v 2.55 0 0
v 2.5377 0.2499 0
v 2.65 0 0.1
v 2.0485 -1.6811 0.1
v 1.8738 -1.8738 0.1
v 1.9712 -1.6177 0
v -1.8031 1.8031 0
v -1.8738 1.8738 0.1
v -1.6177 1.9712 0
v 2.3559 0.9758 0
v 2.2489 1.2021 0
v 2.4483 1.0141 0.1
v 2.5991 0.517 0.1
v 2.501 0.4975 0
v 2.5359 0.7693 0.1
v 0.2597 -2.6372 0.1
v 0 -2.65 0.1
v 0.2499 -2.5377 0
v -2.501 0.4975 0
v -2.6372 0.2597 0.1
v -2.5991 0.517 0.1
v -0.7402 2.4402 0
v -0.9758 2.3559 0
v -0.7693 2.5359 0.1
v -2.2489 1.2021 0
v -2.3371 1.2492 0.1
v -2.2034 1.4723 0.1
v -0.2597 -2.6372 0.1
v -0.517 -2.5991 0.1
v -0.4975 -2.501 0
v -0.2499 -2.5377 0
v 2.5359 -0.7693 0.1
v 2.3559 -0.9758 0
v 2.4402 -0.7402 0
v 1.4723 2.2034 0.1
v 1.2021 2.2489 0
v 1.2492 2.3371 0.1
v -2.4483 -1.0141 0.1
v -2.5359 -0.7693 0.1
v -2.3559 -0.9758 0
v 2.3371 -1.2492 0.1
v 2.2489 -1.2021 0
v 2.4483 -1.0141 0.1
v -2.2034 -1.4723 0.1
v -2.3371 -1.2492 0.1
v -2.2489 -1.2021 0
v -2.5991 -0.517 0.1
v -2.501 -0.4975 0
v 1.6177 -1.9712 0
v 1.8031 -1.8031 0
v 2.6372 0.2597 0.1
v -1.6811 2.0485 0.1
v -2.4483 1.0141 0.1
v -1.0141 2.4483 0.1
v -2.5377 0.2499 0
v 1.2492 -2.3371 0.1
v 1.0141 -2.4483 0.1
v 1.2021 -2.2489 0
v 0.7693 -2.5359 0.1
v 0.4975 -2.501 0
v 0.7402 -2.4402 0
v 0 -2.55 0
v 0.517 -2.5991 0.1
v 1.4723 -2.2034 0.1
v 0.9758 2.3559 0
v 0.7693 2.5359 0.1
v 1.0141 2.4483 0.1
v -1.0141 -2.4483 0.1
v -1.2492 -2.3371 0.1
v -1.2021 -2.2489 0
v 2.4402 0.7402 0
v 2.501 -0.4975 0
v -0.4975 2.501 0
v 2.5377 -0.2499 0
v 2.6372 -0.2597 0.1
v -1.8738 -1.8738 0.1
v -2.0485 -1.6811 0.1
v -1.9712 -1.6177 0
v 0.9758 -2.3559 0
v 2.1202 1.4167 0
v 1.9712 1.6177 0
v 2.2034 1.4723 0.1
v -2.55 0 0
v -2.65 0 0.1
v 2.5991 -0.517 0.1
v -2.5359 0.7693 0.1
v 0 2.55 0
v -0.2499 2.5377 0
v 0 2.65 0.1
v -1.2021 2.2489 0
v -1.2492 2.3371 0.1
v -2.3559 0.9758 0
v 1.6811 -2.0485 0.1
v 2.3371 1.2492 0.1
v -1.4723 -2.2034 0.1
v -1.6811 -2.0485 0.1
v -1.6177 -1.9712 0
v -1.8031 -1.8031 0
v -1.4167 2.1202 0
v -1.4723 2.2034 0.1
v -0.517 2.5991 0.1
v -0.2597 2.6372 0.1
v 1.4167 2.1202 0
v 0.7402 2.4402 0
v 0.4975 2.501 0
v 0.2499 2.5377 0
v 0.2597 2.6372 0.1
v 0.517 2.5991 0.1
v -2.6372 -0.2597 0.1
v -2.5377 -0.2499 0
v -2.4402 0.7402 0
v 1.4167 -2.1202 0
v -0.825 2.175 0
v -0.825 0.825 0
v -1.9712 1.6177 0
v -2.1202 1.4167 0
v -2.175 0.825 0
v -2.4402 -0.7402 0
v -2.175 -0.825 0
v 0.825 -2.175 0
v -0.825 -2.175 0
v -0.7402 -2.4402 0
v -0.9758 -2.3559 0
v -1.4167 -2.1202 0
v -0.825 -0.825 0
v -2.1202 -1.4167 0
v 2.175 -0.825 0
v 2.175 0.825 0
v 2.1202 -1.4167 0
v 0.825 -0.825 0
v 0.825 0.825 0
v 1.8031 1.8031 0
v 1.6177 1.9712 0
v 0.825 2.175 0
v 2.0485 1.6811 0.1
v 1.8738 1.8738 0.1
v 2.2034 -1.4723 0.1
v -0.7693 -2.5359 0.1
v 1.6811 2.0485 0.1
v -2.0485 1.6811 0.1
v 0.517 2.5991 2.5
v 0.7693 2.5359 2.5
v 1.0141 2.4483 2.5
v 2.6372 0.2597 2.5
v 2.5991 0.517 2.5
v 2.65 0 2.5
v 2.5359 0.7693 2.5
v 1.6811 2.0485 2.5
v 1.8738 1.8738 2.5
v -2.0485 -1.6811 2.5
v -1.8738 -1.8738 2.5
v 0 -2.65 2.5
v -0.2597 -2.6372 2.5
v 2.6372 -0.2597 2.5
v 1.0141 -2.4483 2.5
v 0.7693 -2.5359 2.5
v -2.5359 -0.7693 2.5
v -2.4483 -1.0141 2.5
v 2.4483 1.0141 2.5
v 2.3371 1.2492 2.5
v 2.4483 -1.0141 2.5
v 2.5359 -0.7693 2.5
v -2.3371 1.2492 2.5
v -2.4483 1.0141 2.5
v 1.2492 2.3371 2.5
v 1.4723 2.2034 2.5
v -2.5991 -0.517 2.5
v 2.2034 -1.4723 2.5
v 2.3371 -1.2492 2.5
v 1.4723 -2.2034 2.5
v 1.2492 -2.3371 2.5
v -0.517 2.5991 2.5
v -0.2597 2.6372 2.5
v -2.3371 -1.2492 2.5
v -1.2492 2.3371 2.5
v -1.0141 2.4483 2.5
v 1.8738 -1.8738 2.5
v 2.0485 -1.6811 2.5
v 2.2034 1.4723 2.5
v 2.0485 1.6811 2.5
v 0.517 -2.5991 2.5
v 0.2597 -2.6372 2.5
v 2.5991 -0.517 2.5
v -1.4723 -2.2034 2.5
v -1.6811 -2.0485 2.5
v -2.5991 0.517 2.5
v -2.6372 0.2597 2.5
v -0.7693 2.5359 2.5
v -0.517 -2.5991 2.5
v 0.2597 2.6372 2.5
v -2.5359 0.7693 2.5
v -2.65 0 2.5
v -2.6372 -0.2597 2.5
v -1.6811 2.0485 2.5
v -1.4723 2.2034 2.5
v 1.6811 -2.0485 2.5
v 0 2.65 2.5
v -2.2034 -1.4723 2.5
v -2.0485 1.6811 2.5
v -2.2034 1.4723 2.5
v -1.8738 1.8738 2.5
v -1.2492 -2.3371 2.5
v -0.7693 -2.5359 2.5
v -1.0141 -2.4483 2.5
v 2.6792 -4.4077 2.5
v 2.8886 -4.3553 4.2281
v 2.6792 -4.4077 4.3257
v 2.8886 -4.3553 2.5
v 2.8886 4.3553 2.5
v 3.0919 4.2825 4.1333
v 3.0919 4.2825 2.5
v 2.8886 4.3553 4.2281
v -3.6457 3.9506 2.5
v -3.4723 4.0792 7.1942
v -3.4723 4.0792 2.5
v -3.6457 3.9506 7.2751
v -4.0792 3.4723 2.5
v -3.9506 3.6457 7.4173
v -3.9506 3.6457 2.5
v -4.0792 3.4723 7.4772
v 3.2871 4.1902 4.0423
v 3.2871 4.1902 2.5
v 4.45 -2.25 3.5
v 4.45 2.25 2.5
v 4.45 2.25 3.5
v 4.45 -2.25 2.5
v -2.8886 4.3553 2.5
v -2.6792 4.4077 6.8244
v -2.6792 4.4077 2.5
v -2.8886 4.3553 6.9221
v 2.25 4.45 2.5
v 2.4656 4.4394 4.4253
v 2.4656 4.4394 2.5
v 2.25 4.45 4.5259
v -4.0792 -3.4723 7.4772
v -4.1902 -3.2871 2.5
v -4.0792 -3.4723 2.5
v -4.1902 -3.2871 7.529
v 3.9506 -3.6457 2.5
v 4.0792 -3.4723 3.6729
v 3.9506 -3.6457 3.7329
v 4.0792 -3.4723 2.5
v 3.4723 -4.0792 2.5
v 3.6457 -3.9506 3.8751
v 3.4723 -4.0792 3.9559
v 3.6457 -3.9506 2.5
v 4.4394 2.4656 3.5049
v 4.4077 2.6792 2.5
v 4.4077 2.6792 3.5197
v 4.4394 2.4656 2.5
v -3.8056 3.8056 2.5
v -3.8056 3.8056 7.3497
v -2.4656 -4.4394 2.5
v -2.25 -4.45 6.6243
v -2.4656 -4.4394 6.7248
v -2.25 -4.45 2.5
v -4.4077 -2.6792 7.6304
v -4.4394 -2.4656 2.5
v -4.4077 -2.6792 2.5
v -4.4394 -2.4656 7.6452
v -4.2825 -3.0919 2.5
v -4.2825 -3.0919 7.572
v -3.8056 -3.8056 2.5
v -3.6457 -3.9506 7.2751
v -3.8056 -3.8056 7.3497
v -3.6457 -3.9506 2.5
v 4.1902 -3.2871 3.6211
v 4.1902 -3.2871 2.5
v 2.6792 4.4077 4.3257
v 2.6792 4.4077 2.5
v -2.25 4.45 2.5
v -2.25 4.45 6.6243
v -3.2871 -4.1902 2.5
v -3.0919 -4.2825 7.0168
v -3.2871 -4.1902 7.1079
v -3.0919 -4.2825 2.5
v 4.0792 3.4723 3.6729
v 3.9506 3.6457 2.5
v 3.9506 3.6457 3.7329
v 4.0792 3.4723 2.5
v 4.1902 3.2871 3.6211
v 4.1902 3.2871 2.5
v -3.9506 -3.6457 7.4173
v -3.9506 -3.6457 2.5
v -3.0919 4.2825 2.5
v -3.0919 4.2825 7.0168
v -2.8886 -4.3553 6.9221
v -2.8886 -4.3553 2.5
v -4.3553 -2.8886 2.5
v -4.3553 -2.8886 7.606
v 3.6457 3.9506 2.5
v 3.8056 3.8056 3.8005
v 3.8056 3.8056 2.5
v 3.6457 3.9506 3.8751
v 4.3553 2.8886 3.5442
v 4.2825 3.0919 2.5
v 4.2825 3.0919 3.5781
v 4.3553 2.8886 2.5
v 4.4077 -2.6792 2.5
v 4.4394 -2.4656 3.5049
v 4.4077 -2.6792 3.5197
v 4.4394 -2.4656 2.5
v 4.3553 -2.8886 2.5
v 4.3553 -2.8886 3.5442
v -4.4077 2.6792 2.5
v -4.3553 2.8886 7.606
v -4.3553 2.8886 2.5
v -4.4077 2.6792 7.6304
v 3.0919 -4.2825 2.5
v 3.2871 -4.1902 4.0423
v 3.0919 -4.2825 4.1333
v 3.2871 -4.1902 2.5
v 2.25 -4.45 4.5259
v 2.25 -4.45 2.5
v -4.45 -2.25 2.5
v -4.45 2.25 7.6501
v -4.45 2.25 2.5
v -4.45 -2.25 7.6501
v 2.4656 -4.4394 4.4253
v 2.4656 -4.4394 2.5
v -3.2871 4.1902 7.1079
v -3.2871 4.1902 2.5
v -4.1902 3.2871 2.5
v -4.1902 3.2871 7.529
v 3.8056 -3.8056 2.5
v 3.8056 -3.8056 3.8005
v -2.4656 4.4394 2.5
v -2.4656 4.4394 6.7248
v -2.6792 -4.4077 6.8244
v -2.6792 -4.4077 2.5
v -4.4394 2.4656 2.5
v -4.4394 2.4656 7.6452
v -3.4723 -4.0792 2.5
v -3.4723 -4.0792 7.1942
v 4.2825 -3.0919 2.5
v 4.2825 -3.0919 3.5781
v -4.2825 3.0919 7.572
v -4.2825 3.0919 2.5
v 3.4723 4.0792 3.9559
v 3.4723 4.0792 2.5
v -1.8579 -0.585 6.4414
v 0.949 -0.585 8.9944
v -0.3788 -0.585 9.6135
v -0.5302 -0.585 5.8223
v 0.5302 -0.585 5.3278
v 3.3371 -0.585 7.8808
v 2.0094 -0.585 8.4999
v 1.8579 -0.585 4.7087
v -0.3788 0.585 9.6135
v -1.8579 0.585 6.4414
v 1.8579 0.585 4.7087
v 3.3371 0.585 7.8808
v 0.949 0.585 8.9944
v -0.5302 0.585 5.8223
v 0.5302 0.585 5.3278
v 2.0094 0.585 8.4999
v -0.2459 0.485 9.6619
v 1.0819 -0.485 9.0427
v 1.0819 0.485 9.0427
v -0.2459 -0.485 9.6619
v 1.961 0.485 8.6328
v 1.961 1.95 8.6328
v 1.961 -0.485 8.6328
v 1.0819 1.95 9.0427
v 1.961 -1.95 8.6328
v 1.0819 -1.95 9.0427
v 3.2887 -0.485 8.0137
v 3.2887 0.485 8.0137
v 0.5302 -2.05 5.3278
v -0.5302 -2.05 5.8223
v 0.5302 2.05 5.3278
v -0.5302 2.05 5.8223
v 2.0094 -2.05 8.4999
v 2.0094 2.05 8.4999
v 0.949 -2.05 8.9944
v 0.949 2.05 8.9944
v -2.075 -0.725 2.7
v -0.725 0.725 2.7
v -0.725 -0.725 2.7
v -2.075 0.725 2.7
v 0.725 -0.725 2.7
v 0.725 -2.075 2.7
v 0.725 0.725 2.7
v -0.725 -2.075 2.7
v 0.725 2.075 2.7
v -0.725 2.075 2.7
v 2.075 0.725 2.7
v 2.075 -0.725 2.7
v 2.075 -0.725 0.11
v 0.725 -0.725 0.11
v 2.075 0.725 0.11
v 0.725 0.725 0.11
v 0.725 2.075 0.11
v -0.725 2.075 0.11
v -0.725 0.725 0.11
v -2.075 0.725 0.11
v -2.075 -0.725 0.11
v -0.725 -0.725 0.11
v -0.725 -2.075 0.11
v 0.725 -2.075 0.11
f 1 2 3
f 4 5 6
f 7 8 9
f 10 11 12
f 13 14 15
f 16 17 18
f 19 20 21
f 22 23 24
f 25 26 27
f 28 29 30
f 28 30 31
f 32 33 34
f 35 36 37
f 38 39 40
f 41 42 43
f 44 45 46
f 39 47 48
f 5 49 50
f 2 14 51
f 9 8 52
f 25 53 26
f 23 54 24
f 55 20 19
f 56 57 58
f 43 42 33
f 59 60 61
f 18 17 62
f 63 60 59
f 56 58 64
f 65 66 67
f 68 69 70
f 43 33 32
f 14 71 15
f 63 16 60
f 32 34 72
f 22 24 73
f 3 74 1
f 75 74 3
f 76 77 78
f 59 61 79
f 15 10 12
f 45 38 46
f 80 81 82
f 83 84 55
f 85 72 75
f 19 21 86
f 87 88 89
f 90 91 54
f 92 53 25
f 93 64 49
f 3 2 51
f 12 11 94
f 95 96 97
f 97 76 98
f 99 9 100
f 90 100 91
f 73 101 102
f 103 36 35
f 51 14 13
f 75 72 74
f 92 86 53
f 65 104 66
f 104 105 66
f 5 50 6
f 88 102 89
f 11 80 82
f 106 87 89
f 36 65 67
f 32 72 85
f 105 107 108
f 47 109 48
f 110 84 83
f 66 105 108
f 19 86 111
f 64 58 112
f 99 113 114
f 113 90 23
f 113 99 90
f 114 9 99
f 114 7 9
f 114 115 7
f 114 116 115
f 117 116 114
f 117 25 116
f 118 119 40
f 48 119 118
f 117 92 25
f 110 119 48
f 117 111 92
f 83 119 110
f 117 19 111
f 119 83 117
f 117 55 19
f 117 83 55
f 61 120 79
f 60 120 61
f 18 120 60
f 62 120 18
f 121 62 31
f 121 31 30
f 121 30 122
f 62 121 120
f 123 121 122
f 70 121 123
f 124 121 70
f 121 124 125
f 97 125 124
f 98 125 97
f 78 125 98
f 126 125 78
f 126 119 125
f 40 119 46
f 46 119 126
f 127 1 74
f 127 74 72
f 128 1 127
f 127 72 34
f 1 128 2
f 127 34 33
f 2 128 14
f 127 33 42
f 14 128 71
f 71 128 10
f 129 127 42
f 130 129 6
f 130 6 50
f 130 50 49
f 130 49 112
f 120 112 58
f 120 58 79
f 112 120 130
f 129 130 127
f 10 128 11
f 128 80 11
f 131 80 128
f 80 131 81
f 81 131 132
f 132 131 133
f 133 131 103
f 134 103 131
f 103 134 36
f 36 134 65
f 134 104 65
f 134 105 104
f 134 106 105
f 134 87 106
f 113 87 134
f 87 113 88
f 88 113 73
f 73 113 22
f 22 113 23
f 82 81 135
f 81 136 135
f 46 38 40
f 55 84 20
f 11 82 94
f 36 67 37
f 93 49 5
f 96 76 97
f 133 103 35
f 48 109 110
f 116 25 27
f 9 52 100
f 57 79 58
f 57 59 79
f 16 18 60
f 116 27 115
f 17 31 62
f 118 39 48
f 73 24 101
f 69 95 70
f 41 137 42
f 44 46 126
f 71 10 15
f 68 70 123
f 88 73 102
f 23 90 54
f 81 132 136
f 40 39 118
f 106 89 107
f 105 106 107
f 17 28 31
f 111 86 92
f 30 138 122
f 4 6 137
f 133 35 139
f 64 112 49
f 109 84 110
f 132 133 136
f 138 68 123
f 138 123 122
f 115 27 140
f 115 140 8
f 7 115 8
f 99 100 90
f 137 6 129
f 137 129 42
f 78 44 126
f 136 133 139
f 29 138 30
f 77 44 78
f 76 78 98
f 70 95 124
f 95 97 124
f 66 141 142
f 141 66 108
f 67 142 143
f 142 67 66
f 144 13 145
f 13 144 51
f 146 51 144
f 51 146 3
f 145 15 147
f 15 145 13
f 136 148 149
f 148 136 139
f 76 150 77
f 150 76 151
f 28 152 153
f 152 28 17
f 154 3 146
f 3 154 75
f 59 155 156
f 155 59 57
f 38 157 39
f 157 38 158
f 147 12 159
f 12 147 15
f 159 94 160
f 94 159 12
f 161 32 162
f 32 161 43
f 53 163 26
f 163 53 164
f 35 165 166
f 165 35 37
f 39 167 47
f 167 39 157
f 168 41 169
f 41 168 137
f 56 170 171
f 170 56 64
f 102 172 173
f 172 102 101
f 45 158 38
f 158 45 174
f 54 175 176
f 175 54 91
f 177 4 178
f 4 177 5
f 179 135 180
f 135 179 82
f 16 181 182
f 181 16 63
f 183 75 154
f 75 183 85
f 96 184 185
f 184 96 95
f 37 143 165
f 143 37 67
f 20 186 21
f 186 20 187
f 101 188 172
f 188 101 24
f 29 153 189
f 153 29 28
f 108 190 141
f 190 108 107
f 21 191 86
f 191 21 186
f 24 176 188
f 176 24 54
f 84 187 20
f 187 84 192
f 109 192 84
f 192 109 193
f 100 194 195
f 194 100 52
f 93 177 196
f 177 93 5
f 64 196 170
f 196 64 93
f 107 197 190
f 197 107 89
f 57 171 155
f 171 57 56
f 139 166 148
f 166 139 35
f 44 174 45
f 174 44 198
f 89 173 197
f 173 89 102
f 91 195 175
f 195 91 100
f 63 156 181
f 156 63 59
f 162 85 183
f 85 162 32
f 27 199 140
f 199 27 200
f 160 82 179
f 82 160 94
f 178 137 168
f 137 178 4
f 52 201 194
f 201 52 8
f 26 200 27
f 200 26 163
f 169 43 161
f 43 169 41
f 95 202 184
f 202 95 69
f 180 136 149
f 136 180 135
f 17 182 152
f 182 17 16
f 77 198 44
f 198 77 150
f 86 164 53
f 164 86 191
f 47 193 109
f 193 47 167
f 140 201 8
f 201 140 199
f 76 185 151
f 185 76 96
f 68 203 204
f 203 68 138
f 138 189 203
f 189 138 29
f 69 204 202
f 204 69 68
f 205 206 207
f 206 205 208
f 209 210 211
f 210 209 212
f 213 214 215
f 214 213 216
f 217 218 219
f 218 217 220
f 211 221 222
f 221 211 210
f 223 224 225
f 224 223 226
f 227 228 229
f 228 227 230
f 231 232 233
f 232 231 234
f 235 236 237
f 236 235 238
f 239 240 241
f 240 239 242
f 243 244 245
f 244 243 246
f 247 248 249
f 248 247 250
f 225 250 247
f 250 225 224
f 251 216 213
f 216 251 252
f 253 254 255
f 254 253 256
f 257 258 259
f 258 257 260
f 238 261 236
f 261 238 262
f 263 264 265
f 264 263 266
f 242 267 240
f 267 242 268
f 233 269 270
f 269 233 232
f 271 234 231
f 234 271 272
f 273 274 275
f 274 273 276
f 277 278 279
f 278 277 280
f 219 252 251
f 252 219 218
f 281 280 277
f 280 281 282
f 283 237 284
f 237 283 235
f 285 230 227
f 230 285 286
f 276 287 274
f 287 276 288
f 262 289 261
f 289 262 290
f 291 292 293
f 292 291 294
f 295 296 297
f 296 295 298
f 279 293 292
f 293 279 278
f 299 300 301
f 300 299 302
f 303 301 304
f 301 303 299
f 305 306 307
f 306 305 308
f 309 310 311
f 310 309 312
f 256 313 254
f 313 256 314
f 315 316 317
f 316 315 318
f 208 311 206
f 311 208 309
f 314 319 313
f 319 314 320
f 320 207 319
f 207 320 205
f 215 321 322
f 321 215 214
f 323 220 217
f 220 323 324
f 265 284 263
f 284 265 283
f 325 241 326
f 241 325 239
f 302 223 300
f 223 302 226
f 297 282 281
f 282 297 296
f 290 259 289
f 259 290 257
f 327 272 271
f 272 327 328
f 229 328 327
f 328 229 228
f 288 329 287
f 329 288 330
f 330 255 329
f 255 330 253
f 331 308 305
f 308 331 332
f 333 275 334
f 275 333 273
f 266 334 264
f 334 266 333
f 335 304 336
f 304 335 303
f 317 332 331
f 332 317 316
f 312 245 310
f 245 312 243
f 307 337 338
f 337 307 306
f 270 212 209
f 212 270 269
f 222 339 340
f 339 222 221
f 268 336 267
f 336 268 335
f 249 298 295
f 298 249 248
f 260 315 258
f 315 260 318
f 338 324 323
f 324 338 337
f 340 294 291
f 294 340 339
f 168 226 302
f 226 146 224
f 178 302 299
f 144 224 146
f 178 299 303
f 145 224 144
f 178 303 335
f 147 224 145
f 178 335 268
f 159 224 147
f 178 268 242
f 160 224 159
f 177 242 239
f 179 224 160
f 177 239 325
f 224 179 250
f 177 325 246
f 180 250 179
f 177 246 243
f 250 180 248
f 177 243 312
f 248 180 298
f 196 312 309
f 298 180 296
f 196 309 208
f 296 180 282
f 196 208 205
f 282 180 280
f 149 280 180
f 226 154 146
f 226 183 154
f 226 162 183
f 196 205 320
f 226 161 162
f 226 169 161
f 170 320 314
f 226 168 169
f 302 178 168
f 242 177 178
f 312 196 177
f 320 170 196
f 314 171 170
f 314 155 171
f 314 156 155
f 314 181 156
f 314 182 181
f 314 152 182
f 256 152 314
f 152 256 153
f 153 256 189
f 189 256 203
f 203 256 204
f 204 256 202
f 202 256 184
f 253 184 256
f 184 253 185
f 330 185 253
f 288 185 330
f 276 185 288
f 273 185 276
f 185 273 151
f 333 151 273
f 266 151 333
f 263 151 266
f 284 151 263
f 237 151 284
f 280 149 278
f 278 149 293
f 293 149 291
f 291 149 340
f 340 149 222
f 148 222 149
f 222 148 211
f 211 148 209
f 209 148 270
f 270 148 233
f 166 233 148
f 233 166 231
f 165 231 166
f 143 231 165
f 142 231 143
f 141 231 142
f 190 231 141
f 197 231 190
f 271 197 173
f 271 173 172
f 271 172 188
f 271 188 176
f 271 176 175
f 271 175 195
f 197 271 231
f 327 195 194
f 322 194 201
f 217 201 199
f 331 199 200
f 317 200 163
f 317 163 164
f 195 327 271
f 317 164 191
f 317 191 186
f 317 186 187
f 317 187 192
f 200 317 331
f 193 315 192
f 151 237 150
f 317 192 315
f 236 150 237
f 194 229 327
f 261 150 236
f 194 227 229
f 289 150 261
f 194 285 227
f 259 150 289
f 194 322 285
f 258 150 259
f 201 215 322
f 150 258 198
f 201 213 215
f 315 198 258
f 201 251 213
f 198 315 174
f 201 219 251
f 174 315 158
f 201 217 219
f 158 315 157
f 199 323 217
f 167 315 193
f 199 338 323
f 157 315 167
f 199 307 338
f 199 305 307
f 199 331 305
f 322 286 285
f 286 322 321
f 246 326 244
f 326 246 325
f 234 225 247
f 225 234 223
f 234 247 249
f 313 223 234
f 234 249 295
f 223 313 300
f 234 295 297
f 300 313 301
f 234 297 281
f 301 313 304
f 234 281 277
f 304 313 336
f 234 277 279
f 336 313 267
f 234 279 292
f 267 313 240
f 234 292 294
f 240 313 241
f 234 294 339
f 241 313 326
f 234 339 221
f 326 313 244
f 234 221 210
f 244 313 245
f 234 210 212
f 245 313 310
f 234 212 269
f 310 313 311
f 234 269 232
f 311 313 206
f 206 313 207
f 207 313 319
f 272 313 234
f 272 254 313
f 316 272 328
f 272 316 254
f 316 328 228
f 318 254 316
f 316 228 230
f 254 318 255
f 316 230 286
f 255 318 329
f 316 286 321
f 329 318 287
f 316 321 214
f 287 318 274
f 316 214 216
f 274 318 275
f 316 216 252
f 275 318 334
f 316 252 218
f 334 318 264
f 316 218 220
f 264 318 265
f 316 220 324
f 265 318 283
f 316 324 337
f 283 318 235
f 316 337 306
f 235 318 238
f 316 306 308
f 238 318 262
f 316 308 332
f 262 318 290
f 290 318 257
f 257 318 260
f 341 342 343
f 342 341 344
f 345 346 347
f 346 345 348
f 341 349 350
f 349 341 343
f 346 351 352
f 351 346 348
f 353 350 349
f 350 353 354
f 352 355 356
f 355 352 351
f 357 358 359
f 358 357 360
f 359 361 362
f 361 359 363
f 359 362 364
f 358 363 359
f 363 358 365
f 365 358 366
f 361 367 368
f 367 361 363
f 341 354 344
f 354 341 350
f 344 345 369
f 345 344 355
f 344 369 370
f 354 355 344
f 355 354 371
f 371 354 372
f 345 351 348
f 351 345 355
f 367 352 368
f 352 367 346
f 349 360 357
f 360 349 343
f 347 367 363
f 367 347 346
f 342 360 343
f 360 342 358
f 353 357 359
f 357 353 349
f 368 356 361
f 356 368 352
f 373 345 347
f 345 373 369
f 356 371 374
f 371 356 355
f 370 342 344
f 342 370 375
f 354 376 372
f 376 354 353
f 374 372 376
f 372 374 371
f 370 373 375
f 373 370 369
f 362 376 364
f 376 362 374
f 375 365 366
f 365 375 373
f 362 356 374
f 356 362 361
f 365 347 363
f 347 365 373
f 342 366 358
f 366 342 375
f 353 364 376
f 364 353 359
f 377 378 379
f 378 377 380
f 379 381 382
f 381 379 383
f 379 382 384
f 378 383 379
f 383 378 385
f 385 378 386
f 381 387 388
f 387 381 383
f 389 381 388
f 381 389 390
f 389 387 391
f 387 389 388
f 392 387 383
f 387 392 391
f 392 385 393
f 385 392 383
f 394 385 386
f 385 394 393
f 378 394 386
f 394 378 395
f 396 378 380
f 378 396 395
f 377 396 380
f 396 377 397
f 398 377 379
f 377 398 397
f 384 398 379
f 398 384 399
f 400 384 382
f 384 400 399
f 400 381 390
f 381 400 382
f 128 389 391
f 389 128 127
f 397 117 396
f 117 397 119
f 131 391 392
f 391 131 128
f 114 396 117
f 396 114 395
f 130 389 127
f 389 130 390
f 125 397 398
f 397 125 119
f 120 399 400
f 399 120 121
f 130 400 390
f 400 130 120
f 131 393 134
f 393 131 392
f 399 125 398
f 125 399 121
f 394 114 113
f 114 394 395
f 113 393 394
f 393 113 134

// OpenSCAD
// Choc v2 keycap tilter -- an MX-to-MX wedge that drops between a Kailh Choc
// v2 (PG1353) switch and its keycap and leans the cap over by `tilt` degrees,
// in the compass direction `azimuth`.
//
// Re-cut from a Choc v1 tilter kit for the v2 cruciform stem.
//
// An MX cross only engages every 90 degrees, so the lean direction has to be
// built into the part -- you cannot turn an azimuth=0 wedge 45 degrees on the
// switch and have the cross still seat. Two prints per angle cover everything:
//
//   azimuth=0   turned 0/90/180/270 on the switch -> the four square leans
//   azimuth=45  turned 0/90/180/270 on the switch -> the four diagonal leans
//
// Select both with -D tilt=25 -D azimuth=45.

tilt    = 25;         // degrees of lean; 0 leaves a plain riser
azimuth = 0;          // which way it leans, degrees CCW from +x

// ---------------------------------------------------------------------------
// Body -- footprint carried over from the v1 kit this replaces.
// ---------------------------------------------------------------------------
body   = 8.9;         // square footprint
body_r = 2.2;         // corner radius
web    = 1.0;         // solid left between the socket roof and the tilted face

// ---------------------------------------------------------------------------
// Male stem -- a plain MX cruciform, 4.1 x 1.17 Cherry nominal. Confirmed
// fitting real keycaps, so leave it alone.
// ---------------------------------------------------------------------------
cap_cross_l = 4.10;   // arm length  -- Cherry nominal, confirmed on real caps
cap_cross_w = 1.17;   // arm width
stem_h     = 3.60;    // male stem, standing off the tilted face
lead_in    = 0.10;    // chamfer on the socket mouth and on the stem tip

// ---------------------------------------------------------------------------
// Switch side, from the PG1353 datasheet (CPG135301D01 rev A, sheets 1-2).
//
// The v2 stem is not a bare cross. It is a tube: ø6.50 outside, ø5.50 bore,
// with the 4.00 x 1.30 cross standing inside it and a ~0.75 annular slot
// between the two. Cross and rim finish flush, so there is nothing to grip
// above the rim -- a counterbored cross socket gets zero engagement. What
// mates with this reaches DOWN into the slot, exactly as an MX cap does.
//
// It is also what buys the travel. The part lands on the rim 3.30 above the
// housing and the switch moves 3.20, leaving 0.10 at bottom-out -- and the
// travel tolerance is +/-0.25, so check a key presses fully before printing
// a set. A relief step under the body would buy margin at the cost of a
// visible collar; this version goes flat to the boss instead.
// ---------------------------------------------------------------------------
stem_bore  = 5.50;    // bore the boss drops into
stem_od    = 6.50;    // tube outside diameter -- the rim the part rests on
cross_l    = 4.00;    // cross arm span      (datasheet 2-4.00 +/-0.05)
cross_w    = 1.30;    // cross arm width     (datasheet 2-1.30 +/-0.03)

boss_h     = 2.50;    // how far the boss reaches into the slot (3.52 available)
boss_fit   = 0.20;    // boss diameter under the bore
socket_fit = 0.15;    // added to both cross dimensions of the hole
cross_over = 0.20;    // hole past the shoulder, so the rim seats before the cross

$fn = 64;
eps = 0.01;
big = 100;

// ---------------------------------------------------------------------------
// Derived
// ---------------------------------------------------------------------------
boss_d      = stem_bore - boss_fit;   // thin wall that enters the annular slot
hole_l      = cross_l + socket_fit;
hole_w      = cross_w + socket_fit;
hole_top    = boss_h + cross_over;    // cross hole roof
underside_z = boss_h;                 // body underside, straight onto the rim

// How far a centred l x w cross, and the body, reach along the lean direction.
// The tilted face drops fastest there, so these set every height below.
function cross_reach(l, w, a) = max(l / 2 * abs(cos(a)) + w / 2 * abs(sin(a)),
                                    w / 2 * abs(cos(a)) + l / 2 * abs(sin(a)));
function body_reach(a) = (body / 2 - body_r) * (abs(cos(a)) + abs(sin(a))) + body_r;

// Keep `web` of material over the cross hole, and over the body underside at
// its low corner. Whichever the lean brings closest sets the face height; the
// crowding corner moves as the azimuth turns.
plane_z = max(hole_top    + web + cross_reach(hole_l, hole_w, azimuth) * tan(tilt),
              underside_z + web + body_reach(azimuth) * tan(tilt));

// Tallest point, for the echo: the stem's trailing base corner, its trailing
// chamfered tip, or the body's high corner -- whichever the lean puts highest.
tip_z = max(cross_reach(cap_cross_l, cap_cross_w, azimuth) * sin(tilt)
                + (stem_h - lead_in) * cos(tilt),
            cross_reach(cap_cross_l - 2 * lead_in, cap_cross_w - 2 * lead_in, azimuth) * sin(tilt)
                + stem_h * cos(tilt));

echo(str("tilt=", tilt, " azimuth=", azimuth, "  overall height=",
         plane_z + max(tip_z, body_reach(azimuth) * tan(tilt)), "mm"));

// ---------------------------------------------------------------------------
// Profiles
// ---------------------------------------------------------------------------
module cross_2d(l, w) {
    square([l, w], center = true);
    square([w, l], center = true);
}

module body_2d() { offset(r = body_r) square(body - 2 * body_r, center = true); }

// Tip +z over toward `azimuth`, by turning about the horizontal axis square to
// it. The socket below stays put -- it has to stay square to the switch.
module lean() {
    rotate(a = tilt, v = [-sin(azimuth), cos(azimuth), 0]) children();
}

// Everything below the tilted face.
module under_face() {
    translate([0, 0, plane_z]) lean()
        translate([0, 0, -big / 2]) cube(big, center = true);
}

// ---------------------------------------------------------------------------
// Mounts -- built one bar at a time so the chamfers stay rectangular; the
// convex hull of a whole cross would round the arms off.
// ---------------------------------------------------------------------------
module bar_mouth(l, w) {
    hull() {
        translate([0, 0, -eps]) linear_extrude(eps)
            square([l + 2 * lead_in, w + 2 * lead_in], center = true);
        translate([0, 0, lead_in]) linear_extrude(eps) square([l, w], center = true);
    }
}

module bar_tip(l, w) {
    hull() {
        linear_extrude(stem_h - lead_in) square([l, w], center = true);
        translate([0, 0, stem_h - eps]) linear_extrude(eps)
            square([l - 2 * lead_in, w - 2 * lead_in], center = true);
    }
}

// Boss that drops into the annular slot. The body underside above it is what
// lands on the tube rim.
module mount() {
    cylinder(d1 = boss_d - 2 * lead_in, d2 = boss_d, h = lead_in);
    translate([0, 0, lead_in]) cylinder(d = boss_d, h = boss_h - lead_in + eps);
}

module cross_hole() {
    translate([0, 0, -eps]) linear_extrude(hole_top + eps) cross_2d(hole_l, hole_w);
    bar_mouth(hole_l, hole_w);
    rotate([0, 0, 90]) bar_mouth(hole_l, hole_w);
}

module stem() {
    bar_tip(cap_cross_l, cap_cross_w);
    rotate([0, 0, 90]) bar_tip(cap_cross_l, cap_cross_w);
}

// ---------------------------------------------------------------------------
// Assembly -- socket mouth down on the bed.
// ---------------------------------------------------------------------------
difference() {
    union() {
        mount();
        intersection() {
            translate([0, 0, underside_z]) linear_extrude(big) body_2d();
            under_face();
        }
        translate([0, 0, plane_z]) lean() stem();
    }
    cross_hole();
}
